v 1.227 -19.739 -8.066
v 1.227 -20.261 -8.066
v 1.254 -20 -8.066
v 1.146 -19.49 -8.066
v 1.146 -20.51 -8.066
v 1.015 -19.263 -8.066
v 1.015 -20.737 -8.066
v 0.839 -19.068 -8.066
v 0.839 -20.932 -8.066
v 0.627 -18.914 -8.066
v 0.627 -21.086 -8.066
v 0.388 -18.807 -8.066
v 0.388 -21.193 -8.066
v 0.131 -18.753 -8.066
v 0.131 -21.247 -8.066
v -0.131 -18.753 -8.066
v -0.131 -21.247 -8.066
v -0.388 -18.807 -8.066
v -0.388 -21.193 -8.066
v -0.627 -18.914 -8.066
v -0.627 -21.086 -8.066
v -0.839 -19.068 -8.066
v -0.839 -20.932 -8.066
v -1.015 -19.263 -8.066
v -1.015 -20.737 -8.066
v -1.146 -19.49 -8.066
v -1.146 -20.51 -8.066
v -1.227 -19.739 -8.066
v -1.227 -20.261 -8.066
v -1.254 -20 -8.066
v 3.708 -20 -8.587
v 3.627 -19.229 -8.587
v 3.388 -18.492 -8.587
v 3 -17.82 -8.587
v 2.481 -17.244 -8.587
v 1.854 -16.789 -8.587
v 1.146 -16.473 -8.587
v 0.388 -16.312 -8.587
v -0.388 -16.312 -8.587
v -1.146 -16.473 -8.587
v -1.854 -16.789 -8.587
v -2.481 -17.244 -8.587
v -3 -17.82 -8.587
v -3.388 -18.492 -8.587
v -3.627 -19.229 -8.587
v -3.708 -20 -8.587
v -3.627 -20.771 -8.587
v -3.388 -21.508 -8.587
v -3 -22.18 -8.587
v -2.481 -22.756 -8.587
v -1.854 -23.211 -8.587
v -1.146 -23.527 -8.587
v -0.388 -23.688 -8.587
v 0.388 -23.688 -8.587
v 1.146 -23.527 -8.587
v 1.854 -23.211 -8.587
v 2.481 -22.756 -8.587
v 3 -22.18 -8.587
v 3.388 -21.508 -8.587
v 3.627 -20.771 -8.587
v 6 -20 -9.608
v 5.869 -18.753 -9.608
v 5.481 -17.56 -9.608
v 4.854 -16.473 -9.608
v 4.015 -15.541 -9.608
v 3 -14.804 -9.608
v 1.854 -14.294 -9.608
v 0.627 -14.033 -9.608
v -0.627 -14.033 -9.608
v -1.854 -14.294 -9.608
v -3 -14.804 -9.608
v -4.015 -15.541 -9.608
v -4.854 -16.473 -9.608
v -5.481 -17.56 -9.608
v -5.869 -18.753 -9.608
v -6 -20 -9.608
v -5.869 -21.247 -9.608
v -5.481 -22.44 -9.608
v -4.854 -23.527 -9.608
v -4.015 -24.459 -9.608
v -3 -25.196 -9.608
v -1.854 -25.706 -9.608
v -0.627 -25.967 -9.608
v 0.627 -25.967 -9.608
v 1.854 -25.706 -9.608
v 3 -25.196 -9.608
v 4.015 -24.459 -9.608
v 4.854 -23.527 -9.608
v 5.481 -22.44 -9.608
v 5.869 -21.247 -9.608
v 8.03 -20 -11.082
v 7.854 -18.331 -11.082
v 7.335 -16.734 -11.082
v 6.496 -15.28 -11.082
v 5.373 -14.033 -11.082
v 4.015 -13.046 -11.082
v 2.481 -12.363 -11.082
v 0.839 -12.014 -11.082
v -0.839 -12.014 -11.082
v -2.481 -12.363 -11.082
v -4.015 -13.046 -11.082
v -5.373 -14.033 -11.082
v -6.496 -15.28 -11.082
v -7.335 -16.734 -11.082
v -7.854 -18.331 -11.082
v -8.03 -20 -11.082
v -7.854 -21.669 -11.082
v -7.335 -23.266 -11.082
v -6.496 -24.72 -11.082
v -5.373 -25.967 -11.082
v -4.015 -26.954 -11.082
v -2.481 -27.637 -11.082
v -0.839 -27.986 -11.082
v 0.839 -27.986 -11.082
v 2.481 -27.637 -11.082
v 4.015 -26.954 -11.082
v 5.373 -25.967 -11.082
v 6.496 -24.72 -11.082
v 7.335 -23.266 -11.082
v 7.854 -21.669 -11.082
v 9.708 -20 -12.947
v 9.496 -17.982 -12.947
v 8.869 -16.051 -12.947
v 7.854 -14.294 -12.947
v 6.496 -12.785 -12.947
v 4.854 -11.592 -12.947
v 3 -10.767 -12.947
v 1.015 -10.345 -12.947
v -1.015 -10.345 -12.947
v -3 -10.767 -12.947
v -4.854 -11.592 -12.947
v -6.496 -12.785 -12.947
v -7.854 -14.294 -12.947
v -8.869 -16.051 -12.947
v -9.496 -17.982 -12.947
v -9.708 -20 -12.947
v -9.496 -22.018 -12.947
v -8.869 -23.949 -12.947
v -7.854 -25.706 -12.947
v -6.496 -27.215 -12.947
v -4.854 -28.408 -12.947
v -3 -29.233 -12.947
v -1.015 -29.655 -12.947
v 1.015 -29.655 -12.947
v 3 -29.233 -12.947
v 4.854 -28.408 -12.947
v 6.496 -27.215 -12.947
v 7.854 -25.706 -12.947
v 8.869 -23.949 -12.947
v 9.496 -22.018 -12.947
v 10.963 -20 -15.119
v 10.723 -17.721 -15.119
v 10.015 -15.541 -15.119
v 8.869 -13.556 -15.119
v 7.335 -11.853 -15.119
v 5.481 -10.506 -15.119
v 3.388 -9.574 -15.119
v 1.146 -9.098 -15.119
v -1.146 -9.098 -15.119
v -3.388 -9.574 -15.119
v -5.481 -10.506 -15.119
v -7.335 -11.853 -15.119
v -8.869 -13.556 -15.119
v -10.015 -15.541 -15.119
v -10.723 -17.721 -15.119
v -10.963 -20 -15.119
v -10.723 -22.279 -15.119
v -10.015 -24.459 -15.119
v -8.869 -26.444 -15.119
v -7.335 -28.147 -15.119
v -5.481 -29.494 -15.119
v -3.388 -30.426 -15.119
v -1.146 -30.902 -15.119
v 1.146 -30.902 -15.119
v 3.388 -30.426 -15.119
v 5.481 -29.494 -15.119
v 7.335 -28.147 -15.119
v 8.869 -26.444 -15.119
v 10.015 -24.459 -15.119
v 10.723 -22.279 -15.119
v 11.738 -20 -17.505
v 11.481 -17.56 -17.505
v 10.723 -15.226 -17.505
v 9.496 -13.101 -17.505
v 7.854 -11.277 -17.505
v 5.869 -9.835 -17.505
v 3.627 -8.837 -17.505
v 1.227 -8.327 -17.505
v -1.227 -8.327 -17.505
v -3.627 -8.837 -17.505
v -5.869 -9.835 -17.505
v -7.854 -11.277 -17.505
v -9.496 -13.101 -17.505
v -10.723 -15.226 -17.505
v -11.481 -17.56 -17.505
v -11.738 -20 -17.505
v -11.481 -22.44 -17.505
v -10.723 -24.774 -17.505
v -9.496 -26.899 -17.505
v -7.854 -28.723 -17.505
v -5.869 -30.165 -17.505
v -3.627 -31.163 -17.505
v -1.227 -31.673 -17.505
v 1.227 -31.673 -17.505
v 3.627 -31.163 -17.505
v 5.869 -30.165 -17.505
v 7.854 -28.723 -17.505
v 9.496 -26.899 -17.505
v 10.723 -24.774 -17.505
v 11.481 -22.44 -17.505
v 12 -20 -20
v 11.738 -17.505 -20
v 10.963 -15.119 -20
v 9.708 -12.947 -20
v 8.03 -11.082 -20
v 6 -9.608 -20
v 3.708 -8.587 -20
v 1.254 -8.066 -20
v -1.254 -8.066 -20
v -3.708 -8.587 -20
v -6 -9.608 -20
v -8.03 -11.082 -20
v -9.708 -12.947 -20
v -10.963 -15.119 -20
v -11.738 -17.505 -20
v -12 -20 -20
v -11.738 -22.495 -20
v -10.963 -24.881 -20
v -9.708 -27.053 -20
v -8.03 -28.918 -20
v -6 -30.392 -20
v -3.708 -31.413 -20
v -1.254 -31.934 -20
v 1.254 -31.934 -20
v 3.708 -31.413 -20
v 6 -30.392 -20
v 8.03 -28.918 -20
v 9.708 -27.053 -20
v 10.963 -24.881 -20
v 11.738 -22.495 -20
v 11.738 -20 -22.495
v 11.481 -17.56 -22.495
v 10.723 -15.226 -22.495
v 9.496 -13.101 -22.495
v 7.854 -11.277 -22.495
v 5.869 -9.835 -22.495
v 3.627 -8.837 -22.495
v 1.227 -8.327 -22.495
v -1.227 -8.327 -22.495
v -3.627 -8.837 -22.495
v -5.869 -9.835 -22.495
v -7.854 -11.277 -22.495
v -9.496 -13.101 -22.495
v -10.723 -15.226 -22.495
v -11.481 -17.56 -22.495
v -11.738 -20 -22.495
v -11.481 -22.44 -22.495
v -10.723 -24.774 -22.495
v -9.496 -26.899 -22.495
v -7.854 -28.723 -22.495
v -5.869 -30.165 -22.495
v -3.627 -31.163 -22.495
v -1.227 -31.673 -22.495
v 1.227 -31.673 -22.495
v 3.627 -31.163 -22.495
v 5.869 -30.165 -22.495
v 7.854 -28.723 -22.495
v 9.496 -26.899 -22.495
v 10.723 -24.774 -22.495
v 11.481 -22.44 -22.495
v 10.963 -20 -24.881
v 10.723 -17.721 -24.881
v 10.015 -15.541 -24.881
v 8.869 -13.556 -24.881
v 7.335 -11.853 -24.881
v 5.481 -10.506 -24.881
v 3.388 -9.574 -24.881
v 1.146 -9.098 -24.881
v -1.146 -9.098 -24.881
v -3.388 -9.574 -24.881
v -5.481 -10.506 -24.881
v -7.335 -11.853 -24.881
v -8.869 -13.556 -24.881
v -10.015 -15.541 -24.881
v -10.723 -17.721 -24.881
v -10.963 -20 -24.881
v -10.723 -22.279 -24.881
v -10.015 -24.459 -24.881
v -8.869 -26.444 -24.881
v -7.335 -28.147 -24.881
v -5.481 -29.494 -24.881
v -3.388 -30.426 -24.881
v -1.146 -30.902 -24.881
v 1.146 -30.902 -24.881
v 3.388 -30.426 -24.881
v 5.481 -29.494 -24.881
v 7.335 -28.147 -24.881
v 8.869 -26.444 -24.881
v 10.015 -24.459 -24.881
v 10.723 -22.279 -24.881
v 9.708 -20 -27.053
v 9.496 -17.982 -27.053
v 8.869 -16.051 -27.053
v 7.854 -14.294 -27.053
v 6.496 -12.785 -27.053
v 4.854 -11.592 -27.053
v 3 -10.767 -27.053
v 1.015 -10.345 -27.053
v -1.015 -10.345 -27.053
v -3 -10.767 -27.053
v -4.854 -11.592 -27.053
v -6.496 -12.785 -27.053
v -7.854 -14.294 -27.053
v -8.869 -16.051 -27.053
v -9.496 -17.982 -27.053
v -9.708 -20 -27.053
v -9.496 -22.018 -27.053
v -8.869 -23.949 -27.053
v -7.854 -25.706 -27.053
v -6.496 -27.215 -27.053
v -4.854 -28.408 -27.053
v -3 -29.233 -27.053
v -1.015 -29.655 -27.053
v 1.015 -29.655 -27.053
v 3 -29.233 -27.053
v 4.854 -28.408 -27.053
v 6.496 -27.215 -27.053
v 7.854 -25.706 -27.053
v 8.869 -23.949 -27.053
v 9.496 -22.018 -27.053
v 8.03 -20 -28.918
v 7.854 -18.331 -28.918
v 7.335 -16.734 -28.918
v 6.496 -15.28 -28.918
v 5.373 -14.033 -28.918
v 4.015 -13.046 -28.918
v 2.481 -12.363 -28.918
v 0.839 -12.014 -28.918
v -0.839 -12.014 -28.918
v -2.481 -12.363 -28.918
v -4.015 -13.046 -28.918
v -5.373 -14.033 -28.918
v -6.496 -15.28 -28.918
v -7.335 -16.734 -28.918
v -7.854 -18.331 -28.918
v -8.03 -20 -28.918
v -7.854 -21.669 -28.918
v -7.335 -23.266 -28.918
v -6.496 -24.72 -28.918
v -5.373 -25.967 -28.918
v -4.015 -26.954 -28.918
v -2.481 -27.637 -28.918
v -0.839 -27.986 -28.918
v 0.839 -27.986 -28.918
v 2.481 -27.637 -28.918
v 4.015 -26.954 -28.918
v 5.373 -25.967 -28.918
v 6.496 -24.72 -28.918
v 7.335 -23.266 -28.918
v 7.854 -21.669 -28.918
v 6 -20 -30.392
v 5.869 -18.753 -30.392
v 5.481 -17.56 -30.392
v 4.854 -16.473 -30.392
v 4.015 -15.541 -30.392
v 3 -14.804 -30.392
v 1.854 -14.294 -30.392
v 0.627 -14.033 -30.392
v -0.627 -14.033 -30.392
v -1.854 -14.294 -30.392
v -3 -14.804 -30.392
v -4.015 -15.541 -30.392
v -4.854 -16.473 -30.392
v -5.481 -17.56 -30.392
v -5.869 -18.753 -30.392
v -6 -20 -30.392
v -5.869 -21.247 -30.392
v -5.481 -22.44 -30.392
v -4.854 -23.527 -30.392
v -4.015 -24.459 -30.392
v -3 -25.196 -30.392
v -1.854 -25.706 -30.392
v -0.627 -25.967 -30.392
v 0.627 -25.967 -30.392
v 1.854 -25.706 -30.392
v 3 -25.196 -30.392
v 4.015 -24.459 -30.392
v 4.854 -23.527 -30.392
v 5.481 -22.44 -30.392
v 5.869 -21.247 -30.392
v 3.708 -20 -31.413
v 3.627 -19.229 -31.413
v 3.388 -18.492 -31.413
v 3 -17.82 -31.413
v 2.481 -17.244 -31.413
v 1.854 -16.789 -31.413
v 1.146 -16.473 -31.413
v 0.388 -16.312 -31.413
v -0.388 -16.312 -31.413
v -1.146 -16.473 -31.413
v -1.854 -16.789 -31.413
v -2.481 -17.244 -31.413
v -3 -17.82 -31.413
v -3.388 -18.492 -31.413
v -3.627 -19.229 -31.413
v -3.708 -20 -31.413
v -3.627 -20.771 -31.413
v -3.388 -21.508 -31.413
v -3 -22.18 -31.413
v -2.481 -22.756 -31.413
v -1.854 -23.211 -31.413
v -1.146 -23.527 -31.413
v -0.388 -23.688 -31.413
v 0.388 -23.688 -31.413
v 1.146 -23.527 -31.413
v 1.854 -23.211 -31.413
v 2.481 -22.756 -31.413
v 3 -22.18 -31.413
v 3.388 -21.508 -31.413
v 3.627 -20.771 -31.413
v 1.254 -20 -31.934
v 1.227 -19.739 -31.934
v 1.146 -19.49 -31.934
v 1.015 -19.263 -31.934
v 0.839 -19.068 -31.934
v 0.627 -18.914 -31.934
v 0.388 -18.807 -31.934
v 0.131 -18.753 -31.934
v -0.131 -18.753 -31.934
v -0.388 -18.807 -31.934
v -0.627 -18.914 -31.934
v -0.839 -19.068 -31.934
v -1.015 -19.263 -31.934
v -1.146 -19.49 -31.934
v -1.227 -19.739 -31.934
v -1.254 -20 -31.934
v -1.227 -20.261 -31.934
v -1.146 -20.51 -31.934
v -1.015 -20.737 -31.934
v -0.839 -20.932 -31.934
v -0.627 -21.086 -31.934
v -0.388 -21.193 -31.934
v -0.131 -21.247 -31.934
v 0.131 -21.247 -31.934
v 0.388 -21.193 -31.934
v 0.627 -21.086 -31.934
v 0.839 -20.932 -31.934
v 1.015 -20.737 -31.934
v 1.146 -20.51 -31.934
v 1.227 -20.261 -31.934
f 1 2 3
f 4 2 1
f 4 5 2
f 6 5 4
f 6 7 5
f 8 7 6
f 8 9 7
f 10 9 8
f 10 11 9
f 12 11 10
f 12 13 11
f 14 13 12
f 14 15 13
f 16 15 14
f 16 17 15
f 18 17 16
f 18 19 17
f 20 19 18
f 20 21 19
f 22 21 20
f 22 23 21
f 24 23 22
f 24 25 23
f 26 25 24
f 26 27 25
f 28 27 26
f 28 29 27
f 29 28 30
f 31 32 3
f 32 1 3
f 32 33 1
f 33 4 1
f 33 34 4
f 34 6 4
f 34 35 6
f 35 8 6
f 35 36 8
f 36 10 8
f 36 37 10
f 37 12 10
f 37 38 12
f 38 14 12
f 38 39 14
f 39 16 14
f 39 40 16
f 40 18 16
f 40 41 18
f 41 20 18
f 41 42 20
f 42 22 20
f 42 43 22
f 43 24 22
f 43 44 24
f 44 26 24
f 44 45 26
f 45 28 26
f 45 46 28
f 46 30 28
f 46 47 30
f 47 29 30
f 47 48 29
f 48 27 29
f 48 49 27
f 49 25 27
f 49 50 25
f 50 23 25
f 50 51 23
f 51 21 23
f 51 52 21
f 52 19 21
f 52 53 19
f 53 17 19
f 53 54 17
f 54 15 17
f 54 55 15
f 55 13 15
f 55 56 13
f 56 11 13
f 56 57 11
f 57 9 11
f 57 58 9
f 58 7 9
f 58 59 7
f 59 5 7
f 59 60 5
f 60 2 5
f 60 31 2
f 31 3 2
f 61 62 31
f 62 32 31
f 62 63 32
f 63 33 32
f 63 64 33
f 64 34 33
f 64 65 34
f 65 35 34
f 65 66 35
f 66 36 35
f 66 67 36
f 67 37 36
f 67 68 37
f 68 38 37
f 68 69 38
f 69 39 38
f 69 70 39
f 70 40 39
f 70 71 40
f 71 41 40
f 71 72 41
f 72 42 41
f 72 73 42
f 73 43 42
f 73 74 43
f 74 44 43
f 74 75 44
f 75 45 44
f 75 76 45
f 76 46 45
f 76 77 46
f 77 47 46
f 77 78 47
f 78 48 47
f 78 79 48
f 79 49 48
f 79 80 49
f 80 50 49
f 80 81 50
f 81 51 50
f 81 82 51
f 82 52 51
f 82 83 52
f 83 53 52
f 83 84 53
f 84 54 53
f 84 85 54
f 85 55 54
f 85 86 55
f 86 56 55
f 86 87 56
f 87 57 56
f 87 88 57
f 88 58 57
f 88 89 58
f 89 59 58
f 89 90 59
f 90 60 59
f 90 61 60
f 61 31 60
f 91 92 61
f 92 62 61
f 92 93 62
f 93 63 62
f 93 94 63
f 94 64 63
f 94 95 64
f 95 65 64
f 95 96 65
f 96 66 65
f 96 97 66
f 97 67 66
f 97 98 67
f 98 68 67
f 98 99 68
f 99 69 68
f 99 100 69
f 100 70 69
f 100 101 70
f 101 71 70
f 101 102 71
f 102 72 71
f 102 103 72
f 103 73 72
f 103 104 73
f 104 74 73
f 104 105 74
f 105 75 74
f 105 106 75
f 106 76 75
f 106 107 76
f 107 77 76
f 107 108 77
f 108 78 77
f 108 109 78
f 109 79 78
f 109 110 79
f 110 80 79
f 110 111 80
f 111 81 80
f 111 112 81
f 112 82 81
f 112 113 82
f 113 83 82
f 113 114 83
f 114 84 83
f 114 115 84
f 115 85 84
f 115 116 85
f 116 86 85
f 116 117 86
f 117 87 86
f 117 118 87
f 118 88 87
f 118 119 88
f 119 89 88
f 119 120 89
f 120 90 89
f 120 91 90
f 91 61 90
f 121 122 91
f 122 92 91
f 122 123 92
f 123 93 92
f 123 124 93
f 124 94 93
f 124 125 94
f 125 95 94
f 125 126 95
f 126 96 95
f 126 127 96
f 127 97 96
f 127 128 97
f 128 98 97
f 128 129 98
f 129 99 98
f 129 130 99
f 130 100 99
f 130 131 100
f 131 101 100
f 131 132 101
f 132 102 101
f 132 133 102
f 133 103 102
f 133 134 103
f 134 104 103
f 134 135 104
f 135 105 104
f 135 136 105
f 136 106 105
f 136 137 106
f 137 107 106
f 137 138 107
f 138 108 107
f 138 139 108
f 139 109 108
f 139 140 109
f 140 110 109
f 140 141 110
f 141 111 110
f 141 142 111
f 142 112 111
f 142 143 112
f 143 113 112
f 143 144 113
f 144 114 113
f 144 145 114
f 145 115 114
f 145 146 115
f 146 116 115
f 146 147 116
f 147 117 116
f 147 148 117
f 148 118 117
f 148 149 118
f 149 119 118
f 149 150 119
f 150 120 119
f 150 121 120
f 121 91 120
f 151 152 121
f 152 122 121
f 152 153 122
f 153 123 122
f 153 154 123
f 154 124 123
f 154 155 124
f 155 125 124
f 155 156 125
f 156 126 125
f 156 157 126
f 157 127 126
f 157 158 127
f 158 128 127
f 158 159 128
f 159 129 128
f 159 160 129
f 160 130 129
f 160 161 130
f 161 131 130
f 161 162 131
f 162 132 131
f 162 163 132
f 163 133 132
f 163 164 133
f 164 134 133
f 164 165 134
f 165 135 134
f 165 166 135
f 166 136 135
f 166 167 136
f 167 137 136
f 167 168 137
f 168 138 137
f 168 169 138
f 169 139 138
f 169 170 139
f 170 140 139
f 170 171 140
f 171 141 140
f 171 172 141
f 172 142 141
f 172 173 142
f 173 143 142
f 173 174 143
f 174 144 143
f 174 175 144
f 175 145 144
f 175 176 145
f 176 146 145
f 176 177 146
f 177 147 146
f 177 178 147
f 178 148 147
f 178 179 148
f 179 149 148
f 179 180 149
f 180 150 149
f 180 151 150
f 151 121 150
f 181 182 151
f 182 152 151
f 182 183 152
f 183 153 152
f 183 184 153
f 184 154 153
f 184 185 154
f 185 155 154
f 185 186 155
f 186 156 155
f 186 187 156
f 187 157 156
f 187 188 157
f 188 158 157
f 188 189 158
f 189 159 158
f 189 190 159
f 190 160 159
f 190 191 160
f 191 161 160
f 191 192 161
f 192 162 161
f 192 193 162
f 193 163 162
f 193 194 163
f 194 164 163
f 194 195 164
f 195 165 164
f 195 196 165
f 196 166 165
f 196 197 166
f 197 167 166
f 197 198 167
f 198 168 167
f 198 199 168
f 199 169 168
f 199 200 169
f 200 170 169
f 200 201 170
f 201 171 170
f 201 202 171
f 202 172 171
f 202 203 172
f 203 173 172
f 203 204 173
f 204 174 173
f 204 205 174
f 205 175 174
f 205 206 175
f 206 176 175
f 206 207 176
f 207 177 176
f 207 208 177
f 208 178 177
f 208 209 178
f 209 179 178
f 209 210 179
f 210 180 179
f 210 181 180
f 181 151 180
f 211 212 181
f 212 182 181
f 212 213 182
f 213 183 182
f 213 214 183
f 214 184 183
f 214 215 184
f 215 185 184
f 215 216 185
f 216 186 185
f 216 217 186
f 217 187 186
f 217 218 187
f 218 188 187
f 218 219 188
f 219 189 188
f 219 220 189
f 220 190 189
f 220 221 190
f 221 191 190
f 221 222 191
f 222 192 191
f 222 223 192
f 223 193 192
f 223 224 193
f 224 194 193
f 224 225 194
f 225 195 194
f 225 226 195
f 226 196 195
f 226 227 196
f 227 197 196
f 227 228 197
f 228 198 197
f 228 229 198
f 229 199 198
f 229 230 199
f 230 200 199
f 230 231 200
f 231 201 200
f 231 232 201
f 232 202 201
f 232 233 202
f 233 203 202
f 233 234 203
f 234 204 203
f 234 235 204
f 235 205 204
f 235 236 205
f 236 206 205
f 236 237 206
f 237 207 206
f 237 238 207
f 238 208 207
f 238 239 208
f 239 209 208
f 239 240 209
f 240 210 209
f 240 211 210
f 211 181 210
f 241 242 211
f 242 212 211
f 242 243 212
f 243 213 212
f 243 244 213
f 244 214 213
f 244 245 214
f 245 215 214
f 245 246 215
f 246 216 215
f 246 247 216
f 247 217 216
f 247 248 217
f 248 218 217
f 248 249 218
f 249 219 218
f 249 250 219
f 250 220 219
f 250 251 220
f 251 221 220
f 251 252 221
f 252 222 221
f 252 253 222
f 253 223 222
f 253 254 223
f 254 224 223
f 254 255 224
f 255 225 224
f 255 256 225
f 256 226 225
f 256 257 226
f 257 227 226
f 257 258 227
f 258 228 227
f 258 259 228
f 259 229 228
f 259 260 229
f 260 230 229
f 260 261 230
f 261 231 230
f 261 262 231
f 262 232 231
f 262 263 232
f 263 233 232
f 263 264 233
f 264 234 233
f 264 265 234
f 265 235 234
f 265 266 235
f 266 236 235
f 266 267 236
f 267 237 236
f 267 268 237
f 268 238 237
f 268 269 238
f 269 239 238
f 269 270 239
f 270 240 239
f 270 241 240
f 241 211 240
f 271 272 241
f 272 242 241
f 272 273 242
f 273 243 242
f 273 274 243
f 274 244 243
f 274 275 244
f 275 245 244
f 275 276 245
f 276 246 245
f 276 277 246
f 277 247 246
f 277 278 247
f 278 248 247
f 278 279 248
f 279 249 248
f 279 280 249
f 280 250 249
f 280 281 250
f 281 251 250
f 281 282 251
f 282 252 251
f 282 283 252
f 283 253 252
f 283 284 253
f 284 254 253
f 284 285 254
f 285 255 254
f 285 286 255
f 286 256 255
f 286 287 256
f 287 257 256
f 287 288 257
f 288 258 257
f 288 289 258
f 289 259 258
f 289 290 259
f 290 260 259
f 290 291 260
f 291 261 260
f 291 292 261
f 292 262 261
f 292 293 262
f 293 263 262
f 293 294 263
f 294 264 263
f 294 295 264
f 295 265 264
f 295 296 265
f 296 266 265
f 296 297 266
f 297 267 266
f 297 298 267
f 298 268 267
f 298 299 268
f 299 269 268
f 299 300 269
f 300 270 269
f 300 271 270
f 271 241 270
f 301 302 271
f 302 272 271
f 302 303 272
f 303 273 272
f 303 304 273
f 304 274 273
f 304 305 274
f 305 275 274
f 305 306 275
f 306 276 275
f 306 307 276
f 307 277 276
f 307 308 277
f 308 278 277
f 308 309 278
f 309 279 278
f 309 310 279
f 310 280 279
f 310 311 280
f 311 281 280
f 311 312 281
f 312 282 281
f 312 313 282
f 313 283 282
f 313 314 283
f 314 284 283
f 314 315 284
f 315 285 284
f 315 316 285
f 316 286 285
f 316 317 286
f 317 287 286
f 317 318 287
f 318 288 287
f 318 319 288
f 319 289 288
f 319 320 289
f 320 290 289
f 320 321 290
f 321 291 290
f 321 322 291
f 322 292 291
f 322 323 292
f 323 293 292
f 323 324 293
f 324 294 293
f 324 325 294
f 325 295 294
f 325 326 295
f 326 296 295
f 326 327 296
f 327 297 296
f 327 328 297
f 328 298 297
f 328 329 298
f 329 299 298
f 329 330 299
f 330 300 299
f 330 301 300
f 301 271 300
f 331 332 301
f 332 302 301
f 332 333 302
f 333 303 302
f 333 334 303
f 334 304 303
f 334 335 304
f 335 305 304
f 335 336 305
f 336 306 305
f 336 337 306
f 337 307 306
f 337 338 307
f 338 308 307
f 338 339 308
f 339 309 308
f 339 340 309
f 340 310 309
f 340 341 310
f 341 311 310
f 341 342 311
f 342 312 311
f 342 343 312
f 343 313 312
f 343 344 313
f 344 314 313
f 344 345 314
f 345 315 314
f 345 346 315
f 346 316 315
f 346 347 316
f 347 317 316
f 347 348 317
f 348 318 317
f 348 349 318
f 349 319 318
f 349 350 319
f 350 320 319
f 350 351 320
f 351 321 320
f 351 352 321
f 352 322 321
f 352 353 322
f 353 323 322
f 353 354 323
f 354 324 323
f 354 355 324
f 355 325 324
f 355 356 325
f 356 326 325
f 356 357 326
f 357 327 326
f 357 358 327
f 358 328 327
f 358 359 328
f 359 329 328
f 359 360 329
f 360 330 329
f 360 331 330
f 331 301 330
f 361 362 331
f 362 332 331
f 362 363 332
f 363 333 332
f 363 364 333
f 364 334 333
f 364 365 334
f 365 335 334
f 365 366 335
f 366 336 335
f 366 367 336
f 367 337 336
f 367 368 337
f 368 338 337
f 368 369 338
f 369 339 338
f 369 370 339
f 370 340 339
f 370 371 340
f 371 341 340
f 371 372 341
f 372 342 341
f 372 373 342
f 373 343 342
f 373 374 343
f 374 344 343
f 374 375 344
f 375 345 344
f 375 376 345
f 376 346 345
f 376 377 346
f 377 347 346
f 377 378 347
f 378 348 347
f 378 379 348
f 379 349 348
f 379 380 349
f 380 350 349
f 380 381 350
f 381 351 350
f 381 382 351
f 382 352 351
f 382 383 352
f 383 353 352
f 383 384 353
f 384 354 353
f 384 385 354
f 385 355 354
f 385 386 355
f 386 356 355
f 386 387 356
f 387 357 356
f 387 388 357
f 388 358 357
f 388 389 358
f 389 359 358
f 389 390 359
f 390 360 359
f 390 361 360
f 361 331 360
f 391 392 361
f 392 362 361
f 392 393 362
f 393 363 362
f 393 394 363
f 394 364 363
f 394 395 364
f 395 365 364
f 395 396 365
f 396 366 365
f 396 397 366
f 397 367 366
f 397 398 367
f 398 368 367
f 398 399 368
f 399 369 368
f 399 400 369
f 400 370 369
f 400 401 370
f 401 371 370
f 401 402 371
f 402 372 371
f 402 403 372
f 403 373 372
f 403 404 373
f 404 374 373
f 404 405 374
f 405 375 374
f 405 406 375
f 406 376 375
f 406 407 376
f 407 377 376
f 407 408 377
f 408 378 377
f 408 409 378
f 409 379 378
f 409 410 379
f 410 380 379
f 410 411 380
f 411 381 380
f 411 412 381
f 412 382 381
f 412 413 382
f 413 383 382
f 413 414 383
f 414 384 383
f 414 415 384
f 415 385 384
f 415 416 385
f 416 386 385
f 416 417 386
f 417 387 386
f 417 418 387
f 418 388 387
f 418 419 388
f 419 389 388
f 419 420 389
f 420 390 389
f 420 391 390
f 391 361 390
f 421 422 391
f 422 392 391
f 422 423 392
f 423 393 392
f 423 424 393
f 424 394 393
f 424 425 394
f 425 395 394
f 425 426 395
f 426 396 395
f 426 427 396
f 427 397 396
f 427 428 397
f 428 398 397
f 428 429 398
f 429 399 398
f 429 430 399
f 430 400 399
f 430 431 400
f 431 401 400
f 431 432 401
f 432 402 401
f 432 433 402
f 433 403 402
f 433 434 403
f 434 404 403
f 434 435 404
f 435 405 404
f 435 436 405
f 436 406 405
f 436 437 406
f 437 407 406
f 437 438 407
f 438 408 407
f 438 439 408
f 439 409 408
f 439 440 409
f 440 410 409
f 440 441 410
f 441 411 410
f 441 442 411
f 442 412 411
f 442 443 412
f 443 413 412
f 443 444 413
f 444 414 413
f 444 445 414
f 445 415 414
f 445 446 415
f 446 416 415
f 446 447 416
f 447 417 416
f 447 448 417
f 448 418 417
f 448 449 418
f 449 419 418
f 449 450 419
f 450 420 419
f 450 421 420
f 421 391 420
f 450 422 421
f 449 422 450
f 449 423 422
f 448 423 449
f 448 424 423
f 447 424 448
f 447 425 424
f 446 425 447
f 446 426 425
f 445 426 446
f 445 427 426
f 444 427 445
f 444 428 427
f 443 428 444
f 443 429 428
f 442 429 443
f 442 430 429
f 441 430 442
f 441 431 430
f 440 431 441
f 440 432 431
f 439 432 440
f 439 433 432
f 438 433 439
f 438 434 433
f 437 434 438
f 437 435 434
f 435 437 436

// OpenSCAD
// Generated by generate_scads.py
translate([0,-20,-20]) {
  intersection() {
    sphere(r=12);
  }
}
